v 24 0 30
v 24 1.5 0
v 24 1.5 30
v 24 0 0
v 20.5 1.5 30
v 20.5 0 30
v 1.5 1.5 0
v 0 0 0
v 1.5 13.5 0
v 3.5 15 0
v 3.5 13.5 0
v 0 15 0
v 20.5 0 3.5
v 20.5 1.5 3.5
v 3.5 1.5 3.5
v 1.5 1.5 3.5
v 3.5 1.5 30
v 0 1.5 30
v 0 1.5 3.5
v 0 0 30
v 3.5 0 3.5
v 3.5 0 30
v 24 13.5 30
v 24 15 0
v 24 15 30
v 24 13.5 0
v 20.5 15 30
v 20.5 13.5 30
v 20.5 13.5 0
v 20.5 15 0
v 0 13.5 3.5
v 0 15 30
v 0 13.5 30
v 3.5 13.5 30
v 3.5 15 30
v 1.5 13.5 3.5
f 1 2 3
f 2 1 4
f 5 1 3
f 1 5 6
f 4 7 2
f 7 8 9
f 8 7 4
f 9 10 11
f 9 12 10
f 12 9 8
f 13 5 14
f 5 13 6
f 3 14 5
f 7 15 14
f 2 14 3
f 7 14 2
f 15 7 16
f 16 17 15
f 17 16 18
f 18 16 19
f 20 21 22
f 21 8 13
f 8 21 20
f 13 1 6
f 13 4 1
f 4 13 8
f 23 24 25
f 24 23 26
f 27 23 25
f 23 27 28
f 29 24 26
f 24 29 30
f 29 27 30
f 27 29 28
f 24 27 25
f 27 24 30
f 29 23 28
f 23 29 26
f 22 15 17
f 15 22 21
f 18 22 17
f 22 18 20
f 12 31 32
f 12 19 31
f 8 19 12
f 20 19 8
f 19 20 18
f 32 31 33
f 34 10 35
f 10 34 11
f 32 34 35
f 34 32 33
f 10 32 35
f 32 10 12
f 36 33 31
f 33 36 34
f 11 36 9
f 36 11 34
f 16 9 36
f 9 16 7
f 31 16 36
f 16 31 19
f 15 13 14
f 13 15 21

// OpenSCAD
/*cube([28, 14, 2]); //bottom
translate([0, 0, 2]) difference(){ //left
    cube([2, 12, 30]);
    translate([1, 0, 14]) cube([2, 12, 2]);
}
translate([26, 0, 2]) difference(){ //right
    cube([2, 12, 30]); 
    translate([-1, 0, 14]) cube([2, 12, 2]);
}
translate([0, 12, 2]) cube([28, 2, 30]); //back
translate([0, 0, 32]) cube([28, 14, 2]); //top

translate([1, .25, 16]) color([0, 1, 0]) difference(){
    cube ([26, 11.75, 2]); //shelf
    translate([16, 7, -1]) cube([9, 6, 3]);
}
//translate([2, 0, 2]) color([1, 0, 0]) cube([24, .25, 30]); //front


//Bottom house
translate([2, 6, 2]) cube([8, .5, 6]);
translate([2, 6, 8]) cube([8, 6, .5]);
//translate([2, 11.5, 2]) cube([8, .5, 6]);

//Top house
translate([2, 6, 18]) cube([8, .5, 6]);
translate([2, 6, 24]) cube([8, 6, .5]);
//translate([2, 11.75, 18]) cube([8, .5, 6]);

translate([10, 6, 8]) rotate([0, -26.5, 0]) cube([sqrt(320), 6, .5]);

points = [[0, 0, 0], [13, 0, 0], [13, 5.5, 0], [0, 5.5, 0], [0, 5.5, 6.5], [0, 0, 6.5]];
faces = [[0, 1, 2], [0, 3, 2], [0, 1, 5], [0, 3, 4], [0, 5, 4], [2, 3, 4], [1, 2, 4], [1, 5, 4]];
translate([2, .25, 2]) polyhedron(points, faces);
//translate([2, .25, 2]) cube([8, 5.5, 6.5]);
 */

cube([3.5, 1.5, 30]);
translate([0, 13.5, 0]) cube([3.5, 1.5, 30]);
translate([20.5, 0, 0]){
    cube([3.5, 1.5, 30]);
    translate([0, 13.5, 0]) cube([3.5, 1.5, 30]);
}

translate([0, 1.5, 0]) cube([1.5, 12, 3.5]);
translate([3.5, 0, 0]) cube([17, 1.5, 3.5]);
